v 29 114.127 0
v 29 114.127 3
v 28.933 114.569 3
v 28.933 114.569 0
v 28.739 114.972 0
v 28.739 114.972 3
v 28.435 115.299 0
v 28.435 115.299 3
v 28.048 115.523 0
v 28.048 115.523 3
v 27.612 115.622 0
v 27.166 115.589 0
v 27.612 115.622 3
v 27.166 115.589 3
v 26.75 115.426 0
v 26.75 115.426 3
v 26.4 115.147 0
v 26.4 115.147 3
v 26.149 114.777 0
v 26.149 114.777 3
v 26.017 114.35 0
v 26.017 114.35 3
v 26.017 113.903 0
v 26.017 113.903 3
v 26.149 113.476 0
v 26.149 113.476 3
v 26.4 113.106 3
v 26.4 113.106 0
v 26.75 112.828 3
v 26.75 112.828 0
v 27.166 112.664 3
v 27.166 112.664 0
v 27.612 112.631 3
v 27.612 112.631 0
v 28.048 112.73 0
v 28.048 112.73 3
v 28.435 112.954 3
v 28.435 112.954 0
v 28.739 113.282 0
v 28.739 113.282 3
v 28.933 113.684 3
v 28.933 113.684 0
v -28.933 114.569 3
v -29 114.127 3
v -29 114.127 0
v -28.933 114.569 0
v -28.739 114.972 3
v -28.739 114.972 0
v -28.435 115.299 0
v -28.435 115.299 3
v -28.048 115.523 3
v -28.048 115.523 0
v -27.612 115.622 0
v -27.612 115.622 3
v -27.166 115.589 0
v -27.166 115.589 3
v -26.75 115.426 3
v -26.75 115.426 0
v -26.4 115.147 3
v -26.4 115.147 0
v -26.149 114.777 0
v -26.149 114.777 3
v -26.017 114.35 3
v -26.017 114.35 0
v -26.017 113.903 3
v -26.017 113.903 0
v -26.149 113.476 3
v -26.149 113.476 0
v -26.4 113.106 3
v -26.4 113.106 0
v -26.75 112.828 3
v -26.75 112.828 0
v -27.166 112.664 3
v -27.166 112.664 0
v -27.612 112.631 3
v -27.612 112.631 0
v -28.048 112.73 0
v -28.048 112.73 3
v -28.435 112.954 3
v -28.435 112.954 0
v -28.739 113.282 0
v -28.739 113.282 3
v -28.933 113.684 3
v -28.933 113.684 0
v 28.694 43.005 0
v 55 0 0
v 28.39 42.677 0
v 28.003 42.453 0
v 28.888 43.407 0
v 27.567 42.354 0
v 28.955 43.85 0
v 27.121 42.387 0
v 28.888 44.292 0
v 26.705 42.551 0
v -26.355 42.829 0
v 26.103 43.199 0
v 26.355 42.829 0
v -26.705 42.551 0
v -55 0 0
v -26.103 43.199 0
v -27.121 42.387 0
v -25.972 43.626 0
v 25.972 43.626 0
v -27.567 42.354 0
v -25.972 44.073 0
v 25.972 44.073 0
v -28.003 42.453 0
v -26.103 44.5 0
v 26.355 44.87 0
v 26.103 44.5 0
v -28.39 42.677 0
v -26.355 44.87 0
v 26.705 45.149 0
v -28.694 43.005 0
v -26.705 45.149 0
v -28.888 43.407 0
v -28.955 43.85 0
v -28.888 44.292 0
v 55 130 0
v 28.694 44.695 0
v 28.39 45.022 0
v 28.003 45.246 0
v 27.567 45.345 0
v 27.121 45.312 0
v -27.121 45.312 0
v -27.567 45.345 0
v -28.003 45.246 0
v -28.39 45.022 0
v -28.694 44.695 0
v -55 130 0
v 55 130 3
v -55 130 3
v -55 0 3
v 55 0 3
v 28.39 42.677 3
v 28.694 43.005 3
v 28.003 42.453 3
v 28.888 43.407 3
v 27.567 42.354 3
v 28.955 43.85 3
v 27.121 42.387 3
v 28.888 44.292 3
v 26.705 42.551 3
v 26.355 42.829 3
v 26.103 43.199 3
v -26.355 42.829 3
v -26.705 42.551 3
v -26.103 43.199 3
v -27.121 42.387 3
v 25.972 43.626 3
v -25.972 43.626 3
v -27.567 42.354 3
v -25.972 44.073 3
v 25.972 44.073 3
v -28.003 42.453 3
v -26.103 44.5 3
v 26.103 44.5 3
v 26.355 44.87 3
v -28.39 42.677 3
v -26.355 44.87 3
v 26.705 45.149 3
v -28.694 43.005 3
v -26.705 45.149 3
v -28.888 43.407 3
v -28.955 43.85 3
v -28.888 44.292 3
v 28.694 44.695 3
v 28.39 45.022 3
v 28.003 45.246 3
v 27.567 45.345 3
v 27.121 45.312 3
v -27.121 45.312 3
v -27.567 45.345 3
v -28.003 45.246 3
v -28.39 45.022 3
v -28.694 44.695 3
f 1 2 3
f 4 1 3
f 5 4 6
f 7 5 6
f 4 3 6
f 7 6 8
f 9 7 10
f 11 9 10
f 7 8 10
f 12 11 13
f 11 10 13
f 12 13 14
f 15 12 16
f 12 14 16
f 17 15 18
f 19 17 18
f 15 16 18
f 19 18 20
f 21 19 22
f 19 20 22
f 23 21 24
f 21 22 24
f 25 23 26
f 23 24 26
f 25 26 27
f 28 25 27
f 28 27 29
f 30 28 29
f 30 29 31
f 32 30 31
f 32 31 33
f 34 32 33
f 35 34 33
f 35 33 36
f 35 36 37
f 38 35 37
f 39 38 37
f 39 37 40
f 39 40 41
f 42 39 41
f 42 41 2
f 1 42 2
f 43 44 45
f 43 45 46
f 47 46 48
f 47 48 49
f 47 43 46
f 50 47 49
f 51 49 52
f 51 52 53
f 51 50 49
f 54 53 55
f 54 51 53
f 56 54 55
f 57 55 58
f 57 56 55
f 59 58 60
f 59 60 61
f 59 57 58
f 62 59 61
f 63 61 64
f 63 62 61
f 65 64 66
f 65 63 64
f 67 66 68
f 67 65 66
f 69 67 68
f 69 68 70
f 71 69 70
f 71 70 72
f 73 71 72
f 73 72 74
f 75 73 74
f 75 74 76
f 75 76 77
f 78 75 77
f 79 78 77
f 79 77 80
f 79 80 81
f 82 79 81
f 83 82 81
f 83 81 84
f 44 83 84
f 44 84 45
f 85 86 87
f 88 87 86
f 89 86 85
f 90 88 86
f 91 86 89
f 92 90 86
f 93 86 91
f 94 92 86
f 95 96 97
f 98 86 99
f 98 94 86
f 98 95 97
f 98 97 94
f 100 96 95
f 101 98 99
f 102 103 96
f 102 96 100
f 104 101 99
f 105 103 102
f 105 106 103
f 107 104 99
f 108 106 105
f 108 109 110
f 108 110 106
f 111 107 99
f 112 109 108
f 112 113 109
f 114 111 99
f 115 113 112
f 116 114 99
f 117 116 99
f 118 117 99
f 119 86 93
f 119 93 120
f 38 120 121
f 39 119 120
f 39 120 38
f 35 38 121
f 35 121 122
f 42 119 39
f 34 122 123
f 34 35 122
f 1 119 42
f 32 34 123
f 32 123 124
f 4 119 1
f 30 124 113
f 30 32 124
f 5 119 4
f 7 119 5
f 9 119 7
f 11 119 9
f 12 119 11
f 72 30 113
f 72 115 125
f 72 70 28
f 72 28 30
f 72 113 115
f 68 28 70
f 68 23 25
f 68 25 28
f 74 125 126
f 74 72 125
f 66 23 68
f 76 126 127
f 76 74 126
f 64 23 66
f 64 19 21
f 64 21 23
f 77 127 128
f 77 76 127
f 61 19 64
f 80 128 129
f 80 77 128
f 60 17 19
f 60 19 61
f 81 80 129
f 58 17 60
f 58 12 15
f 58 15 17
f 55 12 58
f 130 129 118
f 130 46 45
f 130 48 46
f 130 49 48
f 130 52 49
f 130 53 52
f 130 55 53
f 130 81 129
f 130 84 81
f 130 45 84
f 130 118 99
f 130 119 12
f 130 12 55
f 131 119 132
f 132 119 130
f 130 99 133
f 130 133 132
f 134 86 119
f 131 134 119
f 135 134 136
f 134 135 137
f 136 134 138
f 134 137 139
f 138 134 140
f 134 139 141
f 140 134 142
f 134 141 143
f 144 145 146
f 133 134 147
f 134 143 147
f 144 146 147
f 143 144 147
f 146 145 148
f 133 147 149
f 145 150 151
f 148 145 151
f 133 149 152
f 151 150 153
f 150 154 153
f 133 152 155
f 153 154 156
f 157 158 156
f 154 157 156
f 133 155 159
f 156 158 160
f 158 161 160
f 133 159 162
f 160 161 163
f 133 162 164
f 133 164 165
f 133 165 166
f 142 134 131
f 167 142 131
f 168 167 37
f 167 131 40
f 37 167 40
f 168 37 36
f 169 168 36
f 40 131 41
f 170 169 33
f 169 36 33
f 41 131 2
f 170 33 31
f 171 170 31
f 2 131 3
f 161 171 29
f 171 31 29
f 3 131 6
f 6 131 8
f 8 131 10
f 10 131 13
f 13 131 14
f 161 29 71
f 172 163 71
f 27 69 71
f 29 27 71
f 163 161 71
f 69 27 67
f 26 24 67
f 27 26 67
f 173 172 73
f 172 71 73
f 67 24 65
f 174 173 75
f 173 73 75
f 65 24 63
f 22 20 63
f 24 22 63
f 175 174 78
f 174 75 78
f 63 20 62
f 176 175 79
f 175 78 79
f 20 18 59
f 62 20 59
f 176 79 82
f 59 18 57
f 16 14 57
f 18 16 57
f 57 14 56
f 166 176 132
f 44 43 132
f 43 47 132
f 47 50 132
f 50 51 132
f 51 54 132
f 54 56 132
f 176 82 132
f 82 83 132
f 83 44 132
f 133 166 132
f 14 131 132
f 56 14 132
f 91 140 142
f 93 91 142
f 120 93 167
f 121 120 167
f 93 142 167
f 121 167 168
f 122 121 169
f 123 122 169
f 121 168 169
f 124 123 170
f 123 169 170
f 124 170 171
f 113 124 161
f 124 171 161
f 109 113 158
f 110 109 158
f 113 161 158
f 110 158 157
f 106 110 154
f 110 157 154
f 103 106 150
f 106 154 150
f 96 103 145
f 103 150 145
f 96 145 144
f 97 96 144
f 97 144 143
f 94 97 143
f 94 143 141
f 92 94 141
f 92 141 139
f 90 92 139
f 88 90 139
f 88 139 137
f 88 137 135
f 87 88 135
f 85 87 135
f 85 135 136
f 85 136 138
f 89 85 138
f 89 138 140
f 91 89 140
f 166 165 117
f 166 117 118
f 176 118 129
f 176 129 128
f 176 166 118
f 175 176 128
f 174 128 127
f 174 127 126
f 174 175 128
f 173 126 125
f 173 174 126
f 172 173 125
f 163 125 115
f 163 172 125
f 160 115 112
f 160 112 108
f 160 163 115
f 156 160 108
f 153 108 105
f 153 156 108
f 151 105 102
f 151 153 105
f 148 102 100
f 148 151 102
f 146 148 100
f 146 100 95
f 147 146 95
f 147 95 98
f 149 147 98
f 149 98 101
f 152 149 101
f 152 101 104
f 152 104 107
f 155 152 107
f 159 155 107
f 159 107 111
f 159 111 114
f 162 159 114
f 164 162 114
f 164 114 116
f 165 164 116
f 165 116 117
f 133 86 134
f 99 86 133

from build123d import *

# Parameters (mm, degrees)
F0_W     = 55
F0_H     = 130
F1_DEPTH = 3
F3_R     = 1.5
F4_DEPTH = 25
F5_R     = 1.5
F6_DEPTH = 25


with BuildPart() as f1:
    # F0 (on Top) → F1 (new body)
    with BuildSketch(Plane.XY):
        with Locations((27.5, 65)):
            Rectangle(F0_W, F0_H)
    extrude(amount=F1_DEPTH)

    # F3 (on face) → F4 (cut)
    with BuildSketch(Plane.XY.offset(3)):
        with Locations((27.4549201131, 43.8495948911)):
            Circle(F3_R)
    extrude(amount=-F4_DEPTH, mode=Mode.SUBTRACT)

    # F5 (on face) → F6 (cut)
    with BuildSketch(Plane.XY.offset(3)):
        with Locations((27.5, 114.1266003251)):
            Circle(F5_R)
    extrude(amount=-F6_DEPTH, mode=Mode.SUBTRACT)

    # F8: F1 across plane


with BuildPart() as f1_1:
    add(f1.part)
    add(f1.part.mirror(Plane.YZ))


solid = f1_1.part
